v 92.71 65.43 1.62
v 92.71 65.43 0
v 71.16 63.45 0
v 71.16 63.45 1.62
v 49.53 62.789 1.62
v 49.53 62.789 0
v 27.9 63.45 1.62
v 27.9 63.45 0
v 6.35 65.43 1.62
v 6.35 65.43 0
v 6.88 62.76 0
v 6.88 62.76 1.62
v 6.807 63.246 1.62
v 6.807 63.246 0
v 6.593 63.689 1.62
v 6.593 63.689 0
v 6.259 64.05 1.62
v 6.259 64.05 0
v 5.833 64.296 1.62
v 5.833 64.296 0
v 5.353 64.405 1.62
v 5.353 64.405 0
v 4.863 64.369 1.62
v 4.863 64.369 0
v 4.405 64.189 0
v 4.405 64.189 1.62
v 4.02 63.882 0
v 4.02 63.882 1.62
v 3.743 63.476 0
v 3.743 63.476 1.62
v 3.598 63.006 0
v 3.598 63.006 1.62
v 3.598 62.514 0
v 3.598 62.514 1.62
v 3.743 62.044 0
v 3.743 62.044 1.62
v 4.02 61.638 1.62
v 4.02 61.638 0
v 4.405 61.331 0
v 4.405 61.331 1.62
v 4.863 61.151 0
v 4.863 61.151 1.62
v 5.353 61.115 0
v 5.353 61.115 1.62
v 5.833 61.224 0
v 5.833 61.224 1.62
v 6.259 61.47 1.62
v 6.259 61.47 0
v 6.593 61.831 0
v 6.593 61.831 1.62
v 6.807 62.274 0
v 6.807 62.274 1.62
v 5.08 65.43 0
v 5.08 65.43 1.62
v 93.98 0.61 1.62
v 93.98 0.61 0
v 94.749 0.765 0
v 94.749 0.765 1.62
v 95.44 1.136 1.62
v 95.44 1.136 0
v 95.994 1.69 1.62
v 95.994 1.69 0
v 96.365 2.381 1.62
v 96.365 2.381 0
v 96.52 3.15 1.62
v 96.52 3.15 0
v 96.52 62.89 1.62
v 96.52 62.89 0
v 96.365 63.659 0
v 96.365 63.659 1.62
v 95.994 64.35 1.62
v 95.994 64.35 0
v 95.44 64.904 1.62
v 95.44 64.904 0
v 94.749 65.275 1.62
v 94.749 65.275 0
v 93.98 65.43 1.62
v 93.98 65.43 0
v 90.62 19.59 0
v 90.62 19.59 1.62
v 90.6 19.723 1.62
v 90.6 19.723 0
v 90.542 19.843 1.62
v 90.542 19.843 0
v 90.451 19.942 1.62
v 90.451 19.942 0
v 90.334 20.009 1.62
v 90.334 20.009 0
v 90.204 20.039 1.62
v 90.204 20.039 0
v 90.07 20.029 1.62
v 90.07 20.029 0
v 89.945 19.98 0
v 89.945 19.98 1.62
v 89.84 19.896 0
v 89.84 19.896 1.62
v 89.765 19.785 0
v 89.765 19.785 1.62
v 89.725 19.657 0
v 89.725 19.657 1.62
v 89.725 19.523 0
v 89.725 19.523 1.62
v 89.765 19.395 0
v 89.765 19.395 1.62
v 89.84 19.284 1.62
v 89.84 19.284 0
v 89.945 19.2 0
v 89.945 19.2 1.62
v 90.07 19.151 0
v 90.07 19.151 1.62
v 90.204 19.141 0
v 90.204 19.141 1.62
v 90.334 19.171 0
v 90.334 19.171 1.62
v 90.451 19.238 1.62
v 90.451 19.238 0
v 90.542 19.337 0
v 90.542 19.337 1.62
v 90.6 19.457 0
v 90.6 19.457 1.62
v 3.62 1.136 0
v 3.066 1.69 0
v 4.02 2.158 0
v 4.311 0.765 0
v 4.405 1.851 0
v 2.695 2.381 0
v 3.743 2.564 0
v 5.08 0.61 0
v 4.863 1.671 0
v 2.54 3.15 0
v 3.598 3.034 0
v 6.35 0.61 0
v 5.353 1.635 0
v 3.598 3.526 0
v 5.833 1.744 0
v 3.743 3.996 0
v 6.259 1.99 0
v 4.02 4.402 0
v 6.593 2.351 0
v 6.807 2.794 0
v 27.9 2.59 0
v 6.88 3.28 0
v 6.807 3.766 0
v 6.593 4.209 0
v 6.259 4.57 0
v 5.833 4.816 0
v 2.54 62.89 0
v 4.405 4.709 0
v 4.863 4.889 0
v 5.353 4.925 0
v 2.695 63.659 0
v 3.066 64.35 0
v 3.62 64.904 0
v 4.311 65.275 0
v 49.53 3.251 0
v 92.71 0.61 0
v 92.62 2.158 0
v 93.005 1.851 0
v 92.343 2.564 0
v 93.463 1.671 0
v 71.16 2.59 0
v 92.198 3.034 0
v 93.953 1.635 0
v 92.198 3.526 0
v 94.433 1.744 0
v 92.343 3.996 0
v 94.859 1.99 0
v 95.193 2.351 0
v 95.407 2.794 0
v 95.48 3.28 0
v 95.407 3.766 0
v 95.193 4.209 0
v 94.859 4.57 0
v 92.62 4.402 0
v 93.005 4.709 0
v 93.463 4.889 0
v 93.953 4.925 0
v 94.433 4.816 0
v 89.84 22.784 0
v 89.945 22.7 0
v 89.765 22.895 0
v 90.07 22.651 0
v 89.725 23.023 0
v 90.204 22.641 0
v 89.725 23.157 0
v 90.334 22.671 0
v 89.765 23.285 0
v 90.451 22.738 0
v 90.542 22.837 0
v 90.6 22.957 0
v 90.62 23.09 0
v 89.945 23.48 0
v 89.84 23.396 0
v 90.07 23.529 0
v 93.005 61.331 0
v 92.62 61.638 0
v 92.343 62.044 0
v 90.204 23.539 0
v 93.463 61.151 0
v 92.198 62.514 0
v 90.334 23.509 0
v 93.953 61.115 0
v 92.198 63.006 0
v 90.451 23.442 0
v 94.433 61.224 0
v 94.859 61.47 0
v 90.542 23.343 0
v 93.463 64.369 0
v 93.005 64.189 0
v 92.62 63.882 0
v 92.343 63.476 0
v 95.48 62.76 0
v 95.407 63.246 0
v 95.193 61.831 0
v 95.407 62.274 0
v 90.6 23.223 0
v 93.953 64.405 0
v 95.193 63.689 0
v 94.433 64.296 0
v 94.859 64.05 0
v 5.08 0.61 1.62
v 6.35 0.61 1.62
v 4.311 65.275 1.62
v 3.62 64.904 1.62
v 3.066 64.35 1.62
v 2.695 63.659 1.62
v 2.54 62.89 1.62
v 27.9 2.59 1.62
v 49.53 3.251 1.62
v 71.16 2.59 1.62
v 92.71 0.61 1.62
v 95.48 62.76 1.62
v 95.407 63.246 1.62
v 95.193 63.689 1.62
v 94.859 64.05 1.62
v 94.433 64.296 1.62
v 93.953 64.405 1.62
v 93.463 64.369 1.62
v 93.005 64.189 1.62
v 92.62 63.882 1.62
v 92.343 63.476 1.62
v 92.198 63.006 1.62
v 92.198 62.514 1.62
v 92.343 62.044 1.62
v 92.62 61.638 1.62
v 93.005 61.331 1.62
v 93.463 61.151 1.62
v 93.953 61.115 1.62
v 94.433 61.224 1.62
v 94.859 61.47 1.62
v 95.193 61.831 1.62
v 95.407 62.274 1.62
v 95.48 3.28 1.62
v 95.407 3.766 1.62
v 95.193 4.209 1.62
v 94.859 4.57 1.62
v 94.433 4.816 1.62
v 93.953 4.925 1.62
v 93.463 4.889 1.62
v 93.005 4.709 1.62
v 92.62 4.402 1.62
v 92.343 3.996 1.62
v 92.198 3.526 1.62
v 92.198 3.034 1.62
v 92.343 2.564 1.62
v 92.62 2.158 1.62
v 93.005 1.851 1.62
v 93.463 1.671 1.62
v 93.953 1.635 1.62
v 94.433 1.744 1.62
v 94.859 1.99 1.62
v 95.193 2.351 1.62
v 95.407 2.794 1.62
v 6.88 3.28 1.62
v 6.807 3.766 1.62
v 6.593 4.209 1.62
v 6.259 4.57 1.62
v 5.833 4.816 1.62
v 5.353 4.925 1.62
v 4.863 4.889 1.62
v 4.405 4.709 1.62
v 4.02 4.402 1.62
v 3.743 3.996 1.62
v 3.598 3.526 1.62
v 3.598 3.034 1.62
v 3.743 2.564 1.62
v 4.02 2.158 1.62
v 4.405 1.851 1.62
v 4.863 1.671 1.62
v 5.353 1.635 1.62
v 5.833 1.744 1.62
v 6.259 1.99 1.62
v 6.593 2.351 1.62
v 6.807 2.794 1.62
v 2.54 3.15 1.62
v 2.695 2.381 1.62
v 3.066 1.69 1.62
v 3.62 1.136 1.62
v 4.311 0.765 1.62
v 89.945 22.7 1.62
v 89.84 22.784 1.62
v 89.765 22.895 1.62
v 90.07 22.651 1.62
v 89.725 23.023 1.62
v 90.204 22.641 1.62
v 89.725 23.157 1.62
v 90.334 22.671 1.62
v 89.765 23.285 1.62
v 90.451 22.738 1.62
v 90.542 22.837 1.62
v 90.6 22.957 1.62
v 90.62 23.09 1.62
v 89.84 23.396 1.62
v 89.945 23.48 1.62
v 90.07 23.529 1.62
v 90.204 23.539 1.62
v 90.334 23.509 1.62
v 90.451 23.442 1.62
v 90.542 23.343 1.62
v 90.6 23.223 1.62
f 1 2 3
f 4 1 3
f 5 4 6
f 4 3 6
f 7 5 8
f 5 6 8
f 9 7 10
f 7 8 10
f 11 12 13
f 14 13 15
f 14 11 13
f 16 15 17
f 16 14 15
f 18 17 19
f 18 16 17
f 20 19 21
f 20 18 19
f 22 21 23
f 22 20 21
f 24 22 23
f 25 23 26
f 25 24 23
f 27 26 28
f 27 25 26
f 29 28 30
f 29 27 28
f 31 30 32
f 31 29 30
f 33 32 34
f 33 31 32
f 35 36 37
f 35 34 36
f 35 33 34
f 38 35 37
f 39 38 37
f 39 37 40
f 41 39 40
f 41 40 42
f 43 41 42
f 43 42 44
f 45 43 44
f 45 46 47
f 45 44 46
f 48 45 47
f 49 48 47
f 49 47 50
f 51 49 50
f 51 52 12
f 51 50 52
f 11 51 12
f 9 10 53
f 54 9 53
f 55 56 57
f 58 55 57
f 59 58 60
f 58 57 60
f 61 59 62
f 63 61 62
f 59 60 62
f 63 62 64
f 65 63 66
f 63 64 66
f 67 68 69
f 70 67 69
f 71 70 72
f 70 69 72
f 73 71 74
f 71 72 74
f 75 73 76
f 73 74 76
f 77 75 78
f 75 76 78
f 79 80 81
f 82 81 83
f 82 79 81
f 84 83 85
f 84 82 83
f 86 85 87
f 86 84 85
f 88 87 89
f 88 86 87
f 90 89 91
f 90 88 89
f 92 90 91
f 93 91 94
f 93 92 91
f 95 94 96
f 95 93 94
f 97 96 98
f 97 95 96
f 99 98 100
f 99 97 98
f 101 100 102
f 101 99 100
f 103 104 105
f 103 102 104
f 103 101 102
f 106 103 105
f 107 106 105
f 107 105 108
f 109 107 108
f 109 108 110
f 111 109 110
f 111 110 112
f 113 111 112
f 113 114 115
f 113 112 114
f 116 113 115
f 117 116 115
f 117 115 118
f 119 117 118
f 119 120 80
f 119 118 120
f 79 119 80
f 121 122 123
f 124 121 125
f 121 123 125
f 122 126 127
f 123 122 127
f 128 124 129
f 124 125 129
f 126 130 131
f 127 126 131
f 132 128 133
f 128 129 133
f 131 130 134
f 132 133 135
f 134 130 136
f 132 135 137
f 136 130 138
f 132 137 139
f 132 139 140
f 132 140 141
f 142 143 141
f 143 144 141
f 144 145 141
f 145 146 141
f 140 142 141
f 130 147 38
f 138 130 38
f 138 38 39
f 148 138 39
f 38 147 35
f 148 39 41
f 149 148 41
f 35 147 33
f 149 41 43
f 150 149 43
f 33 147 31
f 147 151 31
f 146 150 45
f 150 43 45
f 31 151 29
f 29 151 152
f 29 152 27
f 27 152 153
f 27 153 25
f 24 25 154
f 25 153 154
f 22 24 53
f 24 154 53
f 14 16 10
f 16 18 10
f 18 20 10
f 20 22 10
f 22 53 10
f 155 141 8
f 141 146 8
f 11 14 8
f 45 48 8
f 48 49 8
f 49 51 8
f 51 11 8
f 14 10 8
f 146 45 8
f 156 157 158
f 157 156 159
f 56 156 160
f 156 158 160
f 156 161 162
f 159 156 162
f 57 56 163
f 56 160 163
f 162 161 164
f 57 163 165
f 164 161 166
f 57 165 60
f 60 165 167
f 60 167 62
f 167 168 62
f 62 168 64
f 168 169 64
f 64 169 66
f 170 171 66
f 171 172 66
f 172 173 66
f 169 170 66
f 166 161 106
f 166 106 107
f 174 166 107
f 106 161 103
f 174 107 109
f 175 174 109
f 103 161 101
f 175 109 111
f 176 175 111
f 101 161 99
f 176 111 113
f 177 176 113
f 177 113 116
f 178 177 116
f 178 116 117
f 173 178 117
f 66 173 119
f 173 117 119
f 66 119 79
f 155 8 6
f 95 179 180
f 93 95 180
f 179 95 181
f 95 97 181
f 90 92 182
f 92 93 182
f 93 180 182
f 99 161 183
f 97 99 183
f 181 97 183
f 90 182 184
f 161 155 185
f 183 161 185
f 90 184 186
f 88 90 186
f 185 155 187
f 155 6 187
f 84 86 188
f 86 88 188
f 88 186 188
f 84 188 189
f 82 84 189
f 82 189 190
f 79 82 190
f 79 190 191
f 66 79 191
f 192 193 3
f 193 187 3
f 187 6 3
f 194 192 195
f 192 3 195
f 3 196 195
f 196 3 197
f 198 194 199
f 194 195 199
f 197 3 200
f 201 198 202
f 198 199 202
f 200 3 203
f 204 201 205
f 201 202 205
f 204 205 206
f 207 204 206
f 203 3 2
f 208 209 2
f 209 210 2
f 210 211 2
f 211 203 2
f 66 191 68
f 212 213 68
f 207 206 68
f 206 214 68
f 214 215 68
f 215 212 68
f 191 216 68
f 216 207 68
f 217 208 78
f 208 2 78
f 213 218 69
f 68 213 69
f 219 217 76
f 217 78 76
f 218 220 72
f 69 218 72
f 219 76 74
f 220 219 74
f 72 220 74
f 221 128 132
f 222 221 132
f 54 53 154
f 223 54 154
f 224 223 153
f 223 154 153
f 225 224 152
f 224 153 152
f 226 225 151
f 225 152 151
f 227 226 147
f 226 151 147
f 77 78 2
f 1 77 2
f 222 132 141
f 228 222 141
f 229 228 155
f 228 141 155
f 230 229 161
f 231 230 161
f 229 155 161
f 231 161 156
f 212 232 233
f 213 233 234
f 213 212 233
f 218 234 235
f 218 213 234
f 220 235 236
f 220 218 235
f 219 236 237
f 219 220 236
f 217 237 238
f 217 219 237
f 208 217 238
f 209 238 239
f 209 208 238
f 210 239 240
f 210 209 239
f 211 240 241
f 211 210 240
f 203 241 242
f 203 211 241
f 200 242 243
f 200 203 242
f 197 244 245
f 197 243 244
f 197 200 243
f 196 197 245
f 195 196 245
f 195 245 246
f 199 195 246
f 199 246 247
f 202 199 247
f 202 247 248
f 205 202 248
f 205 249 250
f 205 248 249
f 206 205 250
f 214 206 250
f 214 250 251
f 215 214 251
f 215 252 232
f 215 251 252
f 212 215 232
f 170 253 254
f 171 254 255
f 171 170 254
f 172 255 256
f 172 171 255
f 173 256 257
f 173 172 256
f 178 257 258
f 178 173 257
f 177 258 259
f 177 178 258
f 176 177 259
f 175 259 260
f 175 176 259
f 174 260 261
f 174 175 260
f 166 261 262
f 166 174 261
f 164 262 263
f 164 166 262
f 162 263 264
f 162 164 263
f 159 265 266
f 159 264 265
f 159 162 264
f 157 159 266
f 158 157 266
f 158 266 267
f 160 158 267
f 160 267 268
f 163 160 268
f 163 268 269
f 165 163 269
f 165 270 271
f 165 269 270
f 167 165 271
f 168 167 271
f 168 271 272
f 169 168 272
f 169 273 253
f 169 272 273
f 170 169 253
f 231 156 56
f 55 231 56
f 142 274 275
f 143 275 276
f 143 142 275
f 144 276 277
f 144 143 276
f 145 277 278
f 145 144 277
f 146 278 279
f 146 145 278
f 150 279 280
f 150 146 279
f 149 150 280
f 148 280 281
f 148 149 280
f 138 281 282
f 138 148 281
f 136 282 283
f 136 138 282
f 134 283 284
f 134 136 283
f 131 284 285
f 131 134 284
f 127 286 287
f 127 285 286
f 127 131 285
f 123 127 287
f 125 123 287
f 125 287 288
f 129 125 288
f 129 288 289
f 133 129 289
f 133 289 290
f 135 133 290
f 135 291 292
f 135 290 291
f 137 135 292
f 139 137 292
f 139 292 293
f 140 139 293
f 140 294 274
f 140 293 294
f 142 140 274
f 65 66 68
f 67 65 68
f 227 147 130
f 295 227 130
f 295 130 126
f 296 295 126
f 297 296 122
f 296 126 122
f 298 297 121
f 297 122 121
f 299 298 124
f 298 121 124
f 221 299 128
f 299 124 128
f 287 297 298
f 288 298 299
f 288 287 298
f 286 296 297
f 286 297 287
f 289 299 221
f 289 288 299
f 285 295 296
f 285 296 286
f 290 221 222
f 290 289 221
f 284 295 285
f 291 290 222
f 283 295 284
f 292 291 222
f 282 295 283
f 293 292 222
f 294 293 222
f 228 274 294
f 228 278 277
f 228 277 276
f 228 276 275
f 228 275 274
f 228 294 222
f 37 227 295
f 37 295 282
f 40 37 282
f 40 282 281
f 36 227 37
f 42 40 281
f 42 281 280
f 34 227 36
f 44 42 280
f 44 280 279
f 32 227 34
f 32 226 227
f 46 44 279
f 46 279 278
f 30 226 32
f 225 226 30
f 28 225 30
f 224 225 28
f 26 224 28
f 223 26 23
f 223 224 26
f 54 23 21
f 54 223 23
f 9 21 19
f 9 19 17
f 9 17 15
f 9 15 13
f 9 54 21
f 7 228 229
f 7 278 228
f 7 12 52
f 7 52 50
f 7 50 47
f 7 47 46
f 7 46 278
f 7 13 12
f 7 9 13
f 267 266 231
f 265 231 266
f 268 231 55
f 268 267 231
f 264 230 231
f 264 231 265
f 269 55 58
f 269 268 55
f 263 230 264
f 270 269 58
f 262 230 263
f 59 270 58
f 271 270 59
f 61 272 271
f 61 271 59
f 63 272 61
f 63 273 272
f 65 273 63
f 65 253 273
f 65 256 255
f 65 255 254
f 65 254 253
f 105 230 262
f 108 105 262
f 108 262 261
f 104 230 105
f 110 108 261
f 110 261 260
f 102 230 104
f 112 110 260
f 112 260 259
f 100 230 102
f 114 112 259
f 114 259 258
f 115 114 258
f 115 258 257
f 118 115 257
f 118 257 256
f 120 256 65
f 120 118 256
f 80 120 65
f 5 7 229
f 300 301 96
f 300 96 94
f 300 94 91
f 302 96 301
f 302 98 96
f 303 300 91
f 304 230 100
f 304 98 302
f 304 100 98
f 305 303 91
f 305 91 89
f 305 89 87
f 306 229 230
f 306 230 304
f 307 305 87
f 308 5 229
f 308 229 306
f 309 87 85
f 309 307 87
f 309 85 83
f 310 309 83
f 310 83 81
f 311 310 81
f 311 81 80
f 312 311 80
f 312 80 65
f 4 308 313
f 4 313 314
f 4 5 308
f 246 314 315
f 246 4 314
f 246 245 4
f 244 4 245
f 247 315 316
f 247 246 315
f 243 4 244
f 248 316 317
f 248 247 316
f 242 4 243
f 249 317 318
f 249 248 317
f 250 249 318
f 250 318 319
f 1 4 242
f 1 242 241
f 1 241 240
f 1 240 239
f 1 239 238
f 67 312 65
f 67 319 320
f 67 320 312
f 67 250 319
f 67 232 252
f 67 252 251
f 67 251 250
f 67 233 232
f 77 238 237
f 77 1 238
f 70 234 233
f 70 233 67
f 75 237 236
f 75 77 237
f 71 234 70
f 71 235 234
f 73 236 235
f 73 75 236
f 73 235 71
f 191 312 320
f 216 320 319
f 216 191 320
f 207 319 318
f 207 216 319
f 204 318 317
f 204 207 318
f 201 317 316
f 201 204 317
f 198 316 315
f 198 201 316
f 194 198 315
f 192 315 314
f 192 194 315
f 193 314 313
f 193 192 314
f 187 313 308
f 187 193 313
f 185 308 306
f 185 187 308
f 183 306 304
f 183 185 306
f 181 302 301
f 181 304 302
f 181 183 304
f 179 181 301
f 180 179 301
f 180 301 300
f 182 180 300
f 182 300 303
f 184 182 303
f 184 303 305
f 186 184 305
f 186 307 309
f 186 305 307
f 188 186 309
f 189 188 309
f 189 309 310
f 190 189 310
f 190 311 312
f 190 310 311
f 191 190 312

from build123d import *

# Parameters (mm, degrees)
BOARD_OUTLINE_DEPTH = 1.62
SKETCH2_R           = 0.45
NPTH_DEPTH          = 117.618264864
SKETCH3_R           = 1.65
PTH_DEPTH           = 117.618264864


with BuildPart() as part:
    # Sketch1 → Board_Outline (new body)
    with BuildSketch(Plane.XY):
        with BuildLine():
            Line((2.54, 62.89), (2.54, 3.15))
            ThreePointArc((2.54, 3.15), (3.322492676, 1.392492676), (5.08, 0.61))
            Line((5.08, 0.61), (6.35, 0.61))
            ThreePointArc((6.35, 0.61), (49.53, 3.251001938), (92.71, 0.61))
            Line((92.71, 0.61), (93.98, 0.61))
            ThreePointArc((93.98, 0.61), (95.737507324, 1.392492676), (96.52, 3.15))
            Line((96.52, 3.15), (96.52, 62.89))
            ThreePointArc((96.52, 62.89), (95.737507324, 64.647507324), (93.98, 65.43))
            Line((93.98, 65.43), (92.71, 65.43))
            ThreePointArc((92.71, 65.43), (49.53, 62.788998062), (6.35, 65.43))
            Line((6.35, 65.43), (5.08, 65.43))
            ThreePointArc((5.08, 65.43), (3.322492676, 64.647507324), (2.54, 62.89))
        make_face()
    extrude(amount=BOARD_OUTLINE_DEPTH)

    # Sketch2 → NPTH (cut, through all)
    with BuildSketch(Plane.XY):
        with Locations((90.17, 23.09)):
            Circle(SKETCH2_R)
        with Locations((90.17, 19.59)):
            Circle(SKETCH2_R)
    extrude(amount=NPTH_DEPTH, mode=Mode.SUBTRACT)

    # Sketch3 → PTH (cut, through all)
    with BuildSketch(Plane.XY):
        with Locations((93.83, 3.28)):
            Circle(SKETCH3_R)
        with Locations((5.23, 3.28)):
            Circle(SKETCH3_R)
        with Locations((5.23, 62.76)):
            Circle(SKETCH3_R)
        with Locations((93.83, 62.76)):
            Circle(SKETCH3_R)
    extrude(amount=PTH_DEPTH, mode=Mode.SUBTRACT)


solid = part.part
